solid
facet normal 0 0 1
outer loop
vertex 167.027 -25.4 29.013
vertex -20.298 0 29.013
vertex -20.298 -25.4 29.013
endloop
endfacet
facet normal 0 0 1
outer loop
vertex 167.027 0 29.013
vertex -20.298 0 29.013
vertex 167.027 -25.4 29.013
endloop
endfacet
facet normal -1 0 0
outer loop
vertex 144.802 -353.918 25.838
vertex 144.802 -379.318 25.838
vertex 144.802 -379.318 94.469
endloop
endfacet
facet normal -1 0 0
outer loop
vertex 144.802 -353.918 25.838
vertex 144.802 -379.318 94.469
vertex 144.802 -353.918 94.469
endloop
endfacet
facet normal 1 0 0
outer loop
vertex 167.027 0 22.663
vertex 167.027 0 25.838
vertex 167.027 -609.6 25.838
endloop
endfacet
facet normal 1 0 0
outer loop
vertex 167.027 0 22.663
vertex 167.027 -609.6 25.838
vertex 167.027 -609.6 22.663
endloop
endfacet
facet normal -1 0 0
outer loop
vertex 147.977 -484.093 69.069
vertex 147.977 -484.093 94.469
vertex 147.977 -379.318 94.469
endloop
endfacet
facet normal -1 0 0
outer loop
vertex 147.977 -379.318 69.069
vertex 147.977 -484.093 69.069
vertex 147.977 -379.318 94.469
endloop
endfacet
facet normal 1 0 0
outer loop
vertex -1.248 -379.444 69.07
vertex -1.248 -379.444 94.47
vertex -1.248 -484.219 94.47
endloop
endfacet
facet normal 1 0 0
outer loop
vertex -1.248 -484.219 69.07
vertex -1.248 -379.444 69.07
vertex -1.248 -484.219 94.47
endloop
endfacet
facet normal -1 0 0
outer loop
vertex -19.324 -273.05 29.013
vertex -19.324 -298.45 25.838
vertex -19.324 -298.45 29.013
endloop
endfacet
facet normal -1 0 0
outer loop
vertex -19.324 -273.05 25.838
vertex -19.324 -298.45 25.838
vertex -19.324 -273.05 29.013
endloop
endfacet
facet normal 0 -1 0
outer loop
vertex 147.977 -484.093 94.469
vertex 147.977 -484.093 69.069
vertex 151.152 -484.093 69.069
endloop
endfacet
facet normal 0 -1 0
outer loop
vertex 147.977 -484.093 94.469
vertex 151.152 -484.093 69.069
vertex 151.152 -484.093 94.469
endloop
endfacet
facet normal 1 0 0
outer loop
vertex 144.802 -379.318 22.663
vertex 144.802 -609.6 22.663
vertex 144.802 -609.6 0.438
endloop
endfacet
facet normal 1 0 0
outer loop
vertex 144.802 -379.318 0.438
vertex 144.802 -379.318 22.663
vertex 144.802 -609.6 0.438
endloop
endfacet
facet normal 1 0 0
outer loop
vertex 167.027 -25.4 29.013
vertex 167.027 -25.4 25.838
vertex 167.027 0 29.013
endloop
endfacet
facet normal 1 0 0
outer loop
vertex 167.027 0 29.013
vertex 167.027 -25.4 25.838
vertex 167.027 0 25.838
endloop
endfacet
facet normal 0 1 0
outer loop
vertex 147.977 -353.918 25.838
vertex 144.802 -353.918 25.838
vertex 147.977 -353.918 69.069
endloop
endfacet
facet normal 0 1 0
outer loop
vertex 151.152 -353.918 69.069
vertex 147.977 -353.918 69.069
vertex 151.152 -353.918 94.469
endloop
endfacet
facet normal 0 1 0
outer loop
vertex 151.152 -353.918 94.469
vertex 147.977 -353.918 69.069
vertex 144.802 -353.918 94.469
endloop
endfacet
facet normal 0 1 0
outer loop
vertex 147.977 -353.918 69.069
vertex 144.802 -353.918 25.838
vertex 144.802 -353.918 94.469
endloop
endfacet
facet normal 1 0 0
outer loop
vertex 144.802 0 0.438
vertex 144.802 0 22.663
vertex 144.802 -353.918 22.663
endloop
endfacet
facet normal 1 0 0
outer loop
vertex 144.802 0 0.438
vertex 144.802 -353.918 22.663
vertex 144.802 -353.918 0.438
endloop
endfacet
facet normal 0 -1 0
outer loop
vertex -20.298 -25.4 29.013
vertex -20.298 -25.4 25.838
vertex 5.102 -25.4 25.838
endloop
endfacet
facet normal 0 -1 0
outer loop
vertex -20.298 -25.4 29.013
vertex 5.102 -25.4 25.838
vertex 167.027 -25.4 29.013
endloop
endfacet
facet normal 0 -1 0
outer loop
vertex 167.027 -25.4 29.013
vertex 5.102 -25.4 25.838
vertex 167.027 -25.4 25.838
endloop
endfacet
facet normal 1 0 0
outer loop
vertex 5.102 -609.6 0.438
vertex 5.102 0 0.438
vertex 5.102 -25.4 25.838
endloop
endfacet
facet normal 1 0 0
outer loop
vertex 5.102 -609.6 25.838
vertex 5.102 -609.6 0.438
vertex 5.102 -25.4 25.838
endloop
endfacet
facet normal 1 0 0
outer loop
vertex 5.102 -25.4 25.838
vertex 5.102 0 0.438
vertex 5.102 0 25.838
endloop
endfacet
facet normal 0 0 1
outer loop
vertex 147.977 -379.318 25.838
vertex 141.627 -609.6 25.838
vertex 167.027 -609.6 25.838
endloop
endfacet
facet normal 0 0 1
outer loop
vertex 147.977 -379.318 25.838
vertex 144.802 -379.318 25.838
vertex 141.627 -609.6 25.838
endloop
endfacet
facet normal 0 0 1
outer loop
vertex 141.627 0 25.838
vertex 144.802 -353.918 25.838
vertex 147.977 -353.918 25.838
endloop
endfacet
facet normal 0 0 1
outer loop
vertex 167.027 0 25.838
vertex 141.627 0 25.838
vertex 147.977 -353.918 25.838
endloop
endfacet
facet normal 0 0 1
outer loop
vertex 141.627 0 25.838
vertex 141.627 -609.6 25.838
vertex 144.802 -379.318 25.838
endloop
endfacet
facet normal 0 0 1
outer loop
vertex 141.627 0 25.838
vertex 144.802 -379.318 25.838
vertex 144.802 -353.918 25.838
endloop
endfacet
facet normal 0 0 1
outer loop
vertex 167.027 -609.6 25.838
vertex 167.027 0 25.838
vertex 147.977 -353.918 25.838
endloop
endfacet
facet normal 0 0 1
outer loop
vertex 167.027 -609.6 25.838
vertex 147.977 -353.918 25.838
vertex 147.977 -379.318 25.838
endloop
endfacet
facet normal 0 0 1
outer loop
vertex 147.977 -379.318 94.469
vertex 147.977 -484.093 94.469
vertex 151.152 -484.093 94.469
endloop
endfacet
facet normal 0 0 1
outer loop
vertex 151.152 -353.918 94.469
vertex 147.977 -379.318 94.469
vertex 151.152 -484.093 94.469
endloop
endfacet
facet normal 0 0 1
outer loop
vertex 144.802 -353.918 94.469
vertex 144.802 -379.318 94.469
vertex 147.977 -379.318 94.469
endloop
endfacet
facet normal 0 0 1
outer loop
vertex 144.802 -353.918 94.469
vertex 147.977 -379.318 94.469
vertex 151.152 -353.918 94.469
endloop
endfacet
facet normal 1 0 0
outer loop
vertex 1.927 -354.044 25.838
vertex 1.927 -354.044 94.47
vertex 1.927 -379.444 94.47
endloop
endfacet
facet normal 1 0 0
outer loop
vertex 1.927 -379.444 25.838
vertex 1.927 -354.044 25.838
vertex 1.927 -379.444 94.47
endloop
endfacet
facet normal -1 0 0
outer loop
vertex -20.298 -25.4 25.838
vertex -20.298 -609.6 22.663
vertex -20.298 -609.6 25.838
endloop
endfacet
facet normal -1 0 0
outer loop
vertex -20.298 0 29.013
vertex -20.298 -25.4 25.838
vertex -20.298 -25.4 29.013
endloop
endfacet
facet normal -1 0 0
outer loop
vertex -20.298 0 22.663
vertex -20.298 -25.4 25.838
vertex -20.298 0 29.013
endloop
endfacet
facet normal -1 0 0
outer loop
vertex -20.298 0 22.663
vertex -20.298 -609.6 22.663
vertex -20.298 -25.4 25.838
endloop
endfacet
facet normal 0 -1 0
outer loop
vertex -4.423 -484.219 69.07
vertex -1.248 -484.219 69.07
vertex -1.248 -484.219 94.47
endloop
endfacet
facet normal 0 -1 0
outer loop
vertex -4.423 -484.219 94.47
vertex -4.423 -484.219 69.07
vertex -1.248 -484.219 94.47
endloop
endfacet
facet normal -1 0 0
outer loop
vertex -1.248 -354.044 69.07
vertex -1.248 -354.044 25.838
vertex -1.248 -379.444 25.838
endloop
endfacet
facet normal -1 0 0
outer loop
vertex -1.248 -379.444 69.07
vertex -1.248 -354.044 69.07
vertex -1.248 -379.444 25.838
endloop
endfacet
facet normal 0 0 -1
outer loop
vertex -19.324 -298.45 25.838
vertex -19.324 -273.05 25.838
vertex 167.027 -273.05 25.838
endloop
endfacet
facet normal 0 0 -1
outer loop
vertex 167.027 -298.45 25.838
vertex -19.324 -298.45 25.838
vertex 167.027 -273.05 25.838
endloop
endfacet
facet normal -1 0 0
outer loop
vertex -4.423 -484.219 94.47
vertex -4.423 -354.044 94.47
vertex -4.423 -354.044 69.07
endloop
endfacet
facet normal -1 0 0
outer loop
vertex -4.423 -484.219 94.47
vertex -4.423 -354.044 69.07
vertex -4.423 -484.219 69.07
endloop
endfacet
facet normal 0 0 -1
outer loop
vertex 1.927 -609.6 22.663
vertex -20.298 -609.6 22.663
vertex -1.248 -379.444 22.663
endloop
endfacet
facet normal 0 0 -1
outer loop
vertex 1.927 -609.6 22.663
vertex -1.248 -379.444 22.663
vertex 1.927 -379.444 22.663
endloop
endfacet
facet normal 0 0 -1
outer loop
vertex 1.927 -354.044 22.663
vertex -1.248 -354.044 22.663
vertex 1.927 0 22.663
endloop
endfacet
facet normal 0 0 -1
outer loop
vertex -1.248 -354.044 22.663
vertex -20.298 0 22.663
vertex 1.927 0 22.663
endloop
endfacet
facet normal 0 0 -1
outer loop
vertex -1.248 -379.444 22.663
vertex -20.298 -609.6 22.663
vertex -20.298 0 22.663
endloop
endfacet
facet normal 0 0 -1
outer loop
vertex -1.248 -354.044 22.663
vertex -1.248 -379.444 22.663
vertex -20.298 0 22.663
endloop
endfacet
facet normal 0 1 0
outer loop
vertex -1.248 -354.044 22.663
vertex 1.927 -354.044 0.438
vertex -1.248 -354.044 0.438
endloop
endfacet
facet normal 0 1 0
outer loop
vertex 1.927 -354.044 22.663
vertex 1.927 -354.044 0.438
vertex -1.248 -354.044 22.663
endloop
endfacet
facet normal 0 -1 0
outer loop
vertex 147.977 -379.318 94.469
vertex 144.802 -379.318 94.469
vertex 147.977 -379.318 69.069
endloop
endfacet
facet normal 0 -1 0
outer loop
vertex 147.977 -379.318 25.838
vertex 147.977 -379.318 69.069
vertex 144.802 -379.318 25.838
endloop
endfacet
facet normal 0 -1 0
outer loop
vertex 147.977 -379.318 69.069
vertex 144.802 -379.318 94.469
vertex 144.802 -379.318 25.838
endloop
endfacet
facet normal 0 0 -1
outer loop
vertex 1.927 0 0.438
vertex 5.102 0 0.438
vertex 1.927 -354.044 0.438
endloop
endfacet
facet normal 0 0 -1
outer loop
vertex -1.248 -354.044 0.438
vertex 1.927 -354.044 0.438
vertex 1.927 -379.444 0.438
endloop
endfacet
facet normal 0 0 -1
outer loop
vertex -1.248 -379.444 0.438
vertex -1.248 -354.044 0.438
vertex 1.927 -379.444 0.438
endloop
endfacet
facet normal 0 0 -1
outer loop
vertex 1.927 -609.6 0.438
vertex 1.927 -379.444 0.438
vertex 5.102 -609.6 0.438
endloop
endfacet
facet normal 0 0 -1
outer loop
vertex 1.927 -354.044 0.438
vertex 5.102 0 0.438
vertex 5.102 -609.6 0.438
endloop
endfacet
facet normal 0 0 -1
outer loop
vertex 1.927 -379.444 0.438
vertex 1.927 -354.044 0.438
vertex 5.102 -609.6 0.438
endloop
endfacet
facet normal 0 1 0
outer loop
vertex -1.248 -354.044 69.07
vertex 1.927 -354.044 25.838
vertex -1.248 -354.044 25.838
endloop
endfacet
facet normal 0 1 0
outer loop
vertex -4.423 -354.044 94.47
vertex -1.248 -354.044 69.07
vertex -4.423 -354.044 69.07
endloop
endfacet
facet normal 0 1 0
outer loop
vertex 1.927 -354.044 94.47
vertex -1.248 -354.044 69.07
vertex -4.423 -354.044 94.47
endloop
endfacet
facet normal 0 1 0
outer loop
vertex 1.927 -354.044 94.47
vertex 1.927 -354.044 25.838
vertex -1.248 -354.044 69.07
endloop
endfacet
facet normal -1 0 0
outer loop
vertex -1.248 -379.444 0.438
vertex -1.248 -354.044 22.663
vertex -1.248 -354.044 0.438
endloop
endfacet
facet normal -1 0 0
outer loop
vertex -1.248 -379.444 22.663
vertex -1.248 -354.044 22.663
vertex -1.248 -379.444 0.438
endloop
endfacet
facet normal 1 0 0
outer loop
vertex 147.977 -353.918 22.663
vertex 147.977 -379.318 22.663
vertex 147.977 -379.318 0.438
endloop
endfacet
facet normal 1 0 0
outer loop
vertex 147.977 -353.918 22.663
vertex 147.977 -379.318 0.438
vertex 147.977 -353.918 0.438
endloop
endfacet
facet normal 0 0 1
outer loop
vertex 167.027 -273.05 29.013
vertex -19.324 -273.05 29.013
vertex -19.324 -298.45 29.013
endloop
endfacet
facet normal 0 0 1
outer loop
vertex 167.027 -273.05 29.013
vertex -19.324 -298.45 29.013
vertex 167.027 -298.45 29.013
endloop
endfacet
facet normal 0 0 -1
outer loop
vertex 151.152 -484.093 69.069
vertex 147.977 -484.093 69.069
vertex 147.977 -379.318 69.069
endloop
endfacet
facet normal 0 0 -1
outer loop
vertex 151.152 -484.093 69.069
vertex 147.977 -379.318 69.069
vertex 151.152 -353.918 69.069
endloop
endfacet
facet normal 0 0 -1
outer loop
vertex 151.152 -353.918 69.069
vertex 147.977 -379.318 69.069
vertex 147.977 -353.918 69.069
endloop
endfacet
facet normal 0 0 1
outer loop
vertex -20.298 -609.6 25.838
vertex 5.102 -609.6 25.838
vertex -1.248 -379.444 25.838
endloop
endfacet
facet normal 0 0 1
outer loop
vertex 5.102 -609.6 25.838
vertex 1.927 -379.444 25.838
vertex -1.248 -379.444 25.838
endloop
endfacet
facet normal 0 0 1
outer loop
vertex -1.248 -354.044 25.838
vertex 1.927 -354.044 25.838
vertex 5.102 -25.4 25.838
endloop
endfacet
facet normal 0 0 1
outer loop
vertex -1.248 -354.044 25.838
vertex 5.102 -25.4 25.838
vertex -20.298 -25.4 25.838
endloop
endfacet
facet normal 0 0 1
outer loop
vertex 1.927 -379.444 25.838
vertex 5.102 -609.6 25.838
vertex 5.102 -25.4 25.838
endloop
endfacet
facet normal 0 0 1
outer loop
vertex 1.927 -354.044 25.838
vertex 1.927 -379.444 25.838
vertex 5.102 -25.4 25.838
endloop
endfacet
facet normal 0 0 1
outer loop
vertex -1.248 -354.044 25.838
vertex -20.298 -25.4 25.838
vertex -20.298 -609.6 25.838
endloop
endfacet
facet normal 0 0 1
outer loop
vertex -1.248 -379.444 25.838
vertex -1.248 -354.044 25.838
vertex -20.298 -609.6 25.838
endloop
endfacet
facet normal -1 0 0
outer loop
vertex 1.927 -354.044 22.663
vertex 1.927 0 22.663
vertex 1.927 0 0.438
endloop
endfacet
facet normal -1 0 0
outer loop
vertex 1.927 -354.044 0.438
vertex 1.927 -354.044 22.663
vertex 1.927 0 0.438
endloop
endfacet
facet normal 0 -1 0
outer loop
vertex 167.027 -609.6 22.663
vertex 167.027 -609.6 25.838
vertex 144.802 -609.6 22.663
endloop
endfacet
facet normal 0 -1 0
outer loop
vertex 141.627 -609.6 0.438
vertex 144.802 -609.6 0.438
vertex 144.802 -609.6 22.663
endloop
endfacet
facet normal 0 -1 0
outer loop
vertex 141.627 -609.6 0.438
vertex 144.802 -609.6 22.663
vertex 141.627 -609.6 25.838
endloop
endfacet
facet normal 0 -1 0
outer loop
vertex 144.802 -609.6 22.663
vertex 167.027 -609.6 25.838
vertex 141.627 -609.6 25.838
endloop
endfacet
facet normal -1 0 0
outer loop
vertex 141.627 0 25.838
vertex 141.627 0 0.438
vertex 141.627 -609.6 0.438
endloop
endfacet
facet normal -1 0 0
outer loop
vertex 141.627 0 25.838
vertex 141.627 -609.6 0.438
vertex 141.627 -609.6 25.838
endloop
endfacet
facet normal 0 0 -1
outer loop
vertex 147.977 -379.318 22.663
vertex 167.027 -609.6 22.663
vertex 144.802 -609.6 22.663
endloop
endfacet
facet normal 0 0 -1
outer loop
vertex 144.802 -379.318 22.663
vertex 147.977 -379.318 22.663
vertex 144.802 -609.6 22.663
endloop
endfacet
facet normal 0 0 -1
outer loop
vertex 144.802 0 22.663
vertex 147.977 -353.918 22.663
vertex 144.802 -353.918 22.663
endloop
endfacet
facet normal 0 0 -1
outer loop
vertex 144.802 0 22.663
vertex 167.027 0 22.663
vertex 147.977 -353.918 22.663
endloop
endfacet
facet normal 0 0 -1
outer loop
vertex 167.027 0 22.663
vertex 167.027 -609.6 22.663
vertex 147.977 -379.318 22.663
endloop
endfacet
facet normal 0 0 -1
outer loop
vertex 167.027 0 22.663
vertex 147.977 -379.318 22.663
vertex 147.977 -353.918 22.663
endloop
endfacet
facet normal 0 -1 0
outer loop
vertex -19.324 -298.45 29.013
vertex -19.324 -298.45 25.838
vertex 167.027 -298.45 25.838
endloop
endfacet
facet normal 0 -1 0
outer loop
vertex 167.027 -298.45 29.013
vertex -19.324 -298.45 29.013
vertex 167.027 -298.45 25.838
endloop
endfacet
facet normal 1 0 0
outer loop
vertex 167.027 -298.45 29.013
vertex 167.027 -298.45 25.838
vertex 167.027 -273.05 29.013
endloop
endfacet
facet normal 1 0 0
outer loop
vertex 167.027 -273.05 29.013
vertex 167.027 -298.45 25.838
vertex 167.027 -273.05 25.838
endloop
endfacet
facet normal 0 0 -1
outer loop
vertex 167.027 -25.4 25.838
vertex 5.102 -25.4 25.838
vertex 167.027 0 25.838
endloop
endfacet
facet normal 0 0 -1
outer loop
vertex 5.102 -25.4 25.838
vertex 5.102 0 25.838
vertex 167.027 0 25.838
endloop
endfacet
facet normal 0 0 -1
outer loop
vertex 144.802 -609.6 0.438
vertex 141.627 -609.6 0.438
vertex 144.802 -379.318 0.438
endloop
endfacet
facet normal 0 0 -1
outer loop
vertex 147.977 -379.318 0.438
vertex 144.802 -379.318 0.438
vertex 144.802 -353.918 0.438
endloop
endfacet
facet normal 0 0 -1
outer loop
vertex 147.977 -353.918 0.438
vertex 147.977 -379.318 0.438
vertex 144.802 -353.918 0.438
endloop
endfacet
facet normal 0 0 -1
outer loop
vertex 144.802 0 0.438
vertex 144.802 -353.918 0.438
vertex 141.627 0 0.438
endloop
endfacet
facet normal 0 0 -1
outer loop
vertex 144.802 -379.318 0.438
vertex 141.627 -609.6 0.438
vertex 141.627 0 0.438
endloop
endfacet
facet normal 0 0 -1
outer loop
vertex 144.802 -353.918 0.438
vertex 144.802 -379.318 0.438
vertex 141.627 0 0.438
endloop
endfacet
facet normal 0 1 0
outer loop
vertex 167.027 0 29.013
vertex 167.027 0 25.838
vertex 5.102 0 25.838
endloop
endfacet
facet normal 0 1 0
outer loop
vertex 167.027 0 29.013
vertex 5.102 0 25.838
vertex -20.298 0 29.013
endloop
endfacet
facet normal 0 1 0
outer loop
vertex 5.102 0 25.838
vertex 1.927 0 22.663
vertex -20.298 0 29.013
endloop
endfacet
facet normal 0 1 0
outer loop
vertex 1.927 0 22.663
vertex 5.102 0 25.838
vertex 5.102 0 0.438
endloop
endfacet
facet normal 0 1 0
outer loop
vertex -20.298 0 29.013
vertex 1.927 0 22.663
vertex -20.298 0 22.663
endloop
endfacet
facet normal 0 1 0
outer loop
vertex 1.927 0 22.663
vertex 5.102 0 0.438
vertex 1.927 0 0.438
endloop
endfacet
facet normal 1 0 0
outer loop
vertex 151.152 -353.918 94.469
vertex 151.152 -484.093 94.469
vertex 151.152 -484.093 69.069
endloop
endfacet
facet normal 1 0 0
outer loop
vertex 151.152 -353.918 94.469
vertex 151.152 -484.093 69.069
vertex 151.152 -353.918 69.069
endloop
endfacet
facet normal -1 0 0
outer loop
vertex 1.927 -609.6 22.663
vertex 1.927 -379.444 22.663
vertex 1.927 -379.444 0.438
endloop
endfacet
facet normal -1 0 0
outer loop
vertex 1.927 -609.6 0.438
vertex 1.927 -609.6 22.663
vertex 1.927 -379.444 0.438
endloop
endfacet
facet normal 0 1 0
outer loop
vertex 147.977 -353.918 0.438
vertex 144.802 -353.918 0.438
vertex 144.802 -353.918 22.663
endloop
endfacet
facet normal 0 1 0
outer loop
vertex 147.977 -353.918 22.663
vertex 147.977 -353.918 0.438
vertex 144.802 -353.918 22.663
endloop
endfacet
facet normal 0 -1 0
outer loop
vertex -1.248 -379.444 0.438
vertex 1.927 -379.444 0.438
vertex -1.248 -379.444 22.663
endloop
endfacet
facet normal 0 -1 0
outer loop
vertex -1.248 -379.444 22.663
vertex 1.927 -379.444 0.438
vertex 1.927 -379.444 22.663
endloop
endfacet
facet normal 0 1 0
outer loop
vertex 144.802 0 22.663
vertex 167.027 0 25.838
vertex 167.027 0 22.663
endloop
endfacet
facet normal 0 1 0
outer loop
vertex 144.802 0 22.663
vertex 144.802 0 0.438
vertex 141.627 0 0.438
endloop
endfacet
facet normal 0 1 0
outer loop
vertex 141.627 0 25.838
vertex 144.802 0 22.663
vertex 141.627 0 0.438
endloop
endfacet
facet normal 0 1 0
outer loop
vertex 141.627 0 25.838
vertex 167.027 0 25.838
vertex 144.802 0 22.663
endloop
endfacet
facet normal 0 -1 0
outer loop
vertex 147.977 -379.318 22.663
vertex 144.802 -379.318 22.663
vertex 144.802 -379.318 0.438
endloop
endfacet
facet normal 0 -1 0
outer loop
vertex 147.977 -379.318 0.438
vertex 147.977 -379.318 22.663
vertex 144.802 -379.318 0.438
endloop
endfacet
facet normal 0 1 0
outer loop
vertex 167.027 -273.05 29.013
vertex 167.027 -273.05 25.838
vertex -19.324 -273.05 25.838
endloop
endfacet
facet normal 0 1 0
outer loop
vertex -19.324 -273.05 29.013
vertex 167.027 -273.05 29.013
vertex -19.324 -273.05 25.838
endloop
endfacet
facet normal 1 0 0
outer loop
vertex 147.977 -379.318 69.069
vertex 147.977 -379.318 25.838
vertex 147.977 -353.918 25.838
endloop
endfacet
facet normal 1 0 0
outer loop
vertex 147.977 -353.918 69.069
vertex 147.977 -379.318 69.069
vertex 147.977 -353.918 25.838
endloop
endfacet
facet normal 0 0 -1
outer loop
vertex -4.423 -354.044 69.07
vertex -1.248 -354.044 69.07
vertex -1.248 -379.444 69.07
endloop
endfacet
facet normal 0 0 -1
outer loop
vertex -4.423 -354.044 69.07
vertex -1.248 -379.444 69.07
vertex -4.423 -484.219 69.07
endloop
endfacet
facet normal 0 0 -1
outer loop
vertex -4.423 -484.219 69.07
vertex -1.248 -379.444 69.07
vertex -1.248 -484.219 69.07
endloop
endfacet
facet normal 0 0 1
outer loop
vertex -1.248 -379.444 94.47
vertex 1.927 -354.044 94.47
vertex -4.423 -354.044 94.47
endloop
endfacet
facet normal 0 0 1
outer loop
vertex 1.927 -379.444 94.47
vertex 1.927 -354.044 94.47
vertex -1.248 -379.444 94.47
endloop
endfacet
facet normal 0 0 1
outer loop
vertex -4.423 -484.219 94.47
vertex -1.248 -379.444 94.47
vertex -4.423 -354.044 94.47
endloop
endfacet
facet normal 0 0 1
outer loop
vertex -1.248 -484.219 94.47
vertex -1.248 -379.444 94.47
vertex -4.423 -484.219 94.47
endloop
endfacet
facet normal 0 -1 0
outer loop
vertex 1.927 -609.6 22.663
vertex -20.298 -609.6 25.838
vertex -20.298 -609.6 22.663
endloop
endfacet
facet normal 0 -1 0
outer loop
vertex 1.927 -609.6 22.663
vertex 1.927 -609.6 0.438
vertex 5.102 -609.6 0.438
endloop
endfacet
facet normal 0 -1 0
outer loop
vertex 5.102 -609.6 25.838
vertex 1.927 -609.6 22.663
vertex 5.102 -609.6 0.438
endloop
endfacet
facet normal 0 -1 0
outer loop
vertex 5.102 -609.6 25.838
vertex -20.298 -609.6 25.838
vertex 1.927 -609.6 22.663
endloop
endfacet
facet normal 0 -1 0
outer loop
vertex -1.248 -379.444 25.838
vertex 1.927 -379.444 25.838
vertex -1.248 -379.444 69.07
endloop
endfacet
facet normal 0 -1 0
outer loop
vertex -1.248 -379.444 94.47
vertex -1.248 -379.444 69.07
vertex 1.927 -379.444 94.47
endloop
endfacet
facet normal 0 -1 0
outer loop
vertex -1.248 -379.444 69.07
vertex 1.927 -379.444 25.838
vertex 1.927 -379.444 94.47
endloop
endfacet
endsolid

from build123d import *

# Parameters (mm, degrees)
F1_DEPTH  = 609.6
F2_W      = 161.925
F2_H      = 25.4
F2_W_2    = 25.4
F3_DEPTH  = 3.175
F5_DEPTH  = 609.6
F6_W      = 25.4
F6_H      = 25.4
F6_W_2    = 160.9506074816
F7_DEPTH  = 3.175
F9_DEPTH  = 3.175
F10_W     = 130.175
F10_H     = 25.4
F11_DEPTH = 3.175
F12_W     = 25.4
F12_H     = 94.032324
F13_DEPTH = 3.175
F14_W     = 130.175
F14_H     = 25.4
F15_DEPTH = 3.175


with BuildPart() as f1:
    # F0 (on Front) → F1 (new body)
    with BuildSketch(Plane.XZ):
        Polygon((5.1018971294, 25.8379301906), (-20.2981028706, 25.8379301906), (-20.2981028706, 22.6629301906), (1.9268971294, 22.6629301906), (1.9268971294, 11.0358623788), (1.9268971294, 0.4379301906), (5.1018971294, 0.4379301906), align=None)
    extrude(amount=F1_DEPTH)

    # F2 (on face) → F3 (join)
    with BuildSketch(Plane.XY.offset(25.8379301906)):
        with Locations((86.0643971294, -12.7)):
            Rectangle(F2_W, F2_H)
        with Locations((-7.5981028706, -12.7)):
            Rectangle(F2_W_2, F2_H)
    extrude(amount=F3_DEPTH)

    # F12 (on face) → F13 (join)
    with BuildSketch(Plane(origin=(1.9268971294, 0, 0), x_dir=(0, -1, 0), z_dir=(-1, 0, 0))):
        with Locations((366.7442287922, 47.4540921906)):
            Rectangle(F12_W, F12_H)
    extrude(amount=F13_DEPTH)

    # F14 (on face) → F15 (join)
    with BuildSketch(Plane(origin=(-1.2481028706, 0, 0), x_dir=(0, -1, 0), z_dir=(-1, 0, 0))):
        with Locations((419.1317287922, 81.7702541906)):
            Rectangle(F14_W, F14_H)
    extrude(amount=F15_DEPTH)


with BuildPart() as f5:
    # F4 (on face) → F5 (new body)
    with BuildSketch(Plane(origin=(0, 0, 0), x_dir=(-1, 0, 0), z_dir=(0, 1, 0))):
        Polygon((-141.6268971294, 25.8379301906), (-167.0268971294, 25.8379301906), (-167.0268971294, 22.6629301906), (-144.8018971294, 22.6629301906), (-144.8018971294, 0.4379301906), (-141.6268971294, 0.4379301906), align=None)
    extrude(amount=-F5_DEPTH)

    # F8 (on face) → F9 (join)
    with BuildSketch(Plane.YZ.offset(144.8018971294)):
        Polygon((-379.3175518513, 0.4379301906), (-353.9175518513, 0.4379301906), (-353.9175518513, 22.6629301906), (-353.9175518513, 94.469383359), (-379.3175518513, 94.469383359), align=None)
    extrude(amount=F9_DEPTH)

    # F10 (on face) → F11 (join)
    with BuildSketch(Plane.YZ.offset(147.9768971294)):
        with Locations((-419.0050518513, 81.769383359)):
            Rectangle(F10_W, F10_H)
    extrude(amount=F11_DEPTH)


with BuildPart() as f7:
    # F6 (on face) → F7 (new body)
    with BuildSketch(Plane.XY.offset(25.8379301906)):
        with Locations((154.3268971294, -285.75)):
            Rectangle(F6_W, F6_H)
        with Locations((61.1515933886, -285.75)):
            Rectangle(F6_W_2, F6_H)
    extrude(amount=F7_DEPTH)


solid = Compound([f1.part, f5.part, f7.part])
